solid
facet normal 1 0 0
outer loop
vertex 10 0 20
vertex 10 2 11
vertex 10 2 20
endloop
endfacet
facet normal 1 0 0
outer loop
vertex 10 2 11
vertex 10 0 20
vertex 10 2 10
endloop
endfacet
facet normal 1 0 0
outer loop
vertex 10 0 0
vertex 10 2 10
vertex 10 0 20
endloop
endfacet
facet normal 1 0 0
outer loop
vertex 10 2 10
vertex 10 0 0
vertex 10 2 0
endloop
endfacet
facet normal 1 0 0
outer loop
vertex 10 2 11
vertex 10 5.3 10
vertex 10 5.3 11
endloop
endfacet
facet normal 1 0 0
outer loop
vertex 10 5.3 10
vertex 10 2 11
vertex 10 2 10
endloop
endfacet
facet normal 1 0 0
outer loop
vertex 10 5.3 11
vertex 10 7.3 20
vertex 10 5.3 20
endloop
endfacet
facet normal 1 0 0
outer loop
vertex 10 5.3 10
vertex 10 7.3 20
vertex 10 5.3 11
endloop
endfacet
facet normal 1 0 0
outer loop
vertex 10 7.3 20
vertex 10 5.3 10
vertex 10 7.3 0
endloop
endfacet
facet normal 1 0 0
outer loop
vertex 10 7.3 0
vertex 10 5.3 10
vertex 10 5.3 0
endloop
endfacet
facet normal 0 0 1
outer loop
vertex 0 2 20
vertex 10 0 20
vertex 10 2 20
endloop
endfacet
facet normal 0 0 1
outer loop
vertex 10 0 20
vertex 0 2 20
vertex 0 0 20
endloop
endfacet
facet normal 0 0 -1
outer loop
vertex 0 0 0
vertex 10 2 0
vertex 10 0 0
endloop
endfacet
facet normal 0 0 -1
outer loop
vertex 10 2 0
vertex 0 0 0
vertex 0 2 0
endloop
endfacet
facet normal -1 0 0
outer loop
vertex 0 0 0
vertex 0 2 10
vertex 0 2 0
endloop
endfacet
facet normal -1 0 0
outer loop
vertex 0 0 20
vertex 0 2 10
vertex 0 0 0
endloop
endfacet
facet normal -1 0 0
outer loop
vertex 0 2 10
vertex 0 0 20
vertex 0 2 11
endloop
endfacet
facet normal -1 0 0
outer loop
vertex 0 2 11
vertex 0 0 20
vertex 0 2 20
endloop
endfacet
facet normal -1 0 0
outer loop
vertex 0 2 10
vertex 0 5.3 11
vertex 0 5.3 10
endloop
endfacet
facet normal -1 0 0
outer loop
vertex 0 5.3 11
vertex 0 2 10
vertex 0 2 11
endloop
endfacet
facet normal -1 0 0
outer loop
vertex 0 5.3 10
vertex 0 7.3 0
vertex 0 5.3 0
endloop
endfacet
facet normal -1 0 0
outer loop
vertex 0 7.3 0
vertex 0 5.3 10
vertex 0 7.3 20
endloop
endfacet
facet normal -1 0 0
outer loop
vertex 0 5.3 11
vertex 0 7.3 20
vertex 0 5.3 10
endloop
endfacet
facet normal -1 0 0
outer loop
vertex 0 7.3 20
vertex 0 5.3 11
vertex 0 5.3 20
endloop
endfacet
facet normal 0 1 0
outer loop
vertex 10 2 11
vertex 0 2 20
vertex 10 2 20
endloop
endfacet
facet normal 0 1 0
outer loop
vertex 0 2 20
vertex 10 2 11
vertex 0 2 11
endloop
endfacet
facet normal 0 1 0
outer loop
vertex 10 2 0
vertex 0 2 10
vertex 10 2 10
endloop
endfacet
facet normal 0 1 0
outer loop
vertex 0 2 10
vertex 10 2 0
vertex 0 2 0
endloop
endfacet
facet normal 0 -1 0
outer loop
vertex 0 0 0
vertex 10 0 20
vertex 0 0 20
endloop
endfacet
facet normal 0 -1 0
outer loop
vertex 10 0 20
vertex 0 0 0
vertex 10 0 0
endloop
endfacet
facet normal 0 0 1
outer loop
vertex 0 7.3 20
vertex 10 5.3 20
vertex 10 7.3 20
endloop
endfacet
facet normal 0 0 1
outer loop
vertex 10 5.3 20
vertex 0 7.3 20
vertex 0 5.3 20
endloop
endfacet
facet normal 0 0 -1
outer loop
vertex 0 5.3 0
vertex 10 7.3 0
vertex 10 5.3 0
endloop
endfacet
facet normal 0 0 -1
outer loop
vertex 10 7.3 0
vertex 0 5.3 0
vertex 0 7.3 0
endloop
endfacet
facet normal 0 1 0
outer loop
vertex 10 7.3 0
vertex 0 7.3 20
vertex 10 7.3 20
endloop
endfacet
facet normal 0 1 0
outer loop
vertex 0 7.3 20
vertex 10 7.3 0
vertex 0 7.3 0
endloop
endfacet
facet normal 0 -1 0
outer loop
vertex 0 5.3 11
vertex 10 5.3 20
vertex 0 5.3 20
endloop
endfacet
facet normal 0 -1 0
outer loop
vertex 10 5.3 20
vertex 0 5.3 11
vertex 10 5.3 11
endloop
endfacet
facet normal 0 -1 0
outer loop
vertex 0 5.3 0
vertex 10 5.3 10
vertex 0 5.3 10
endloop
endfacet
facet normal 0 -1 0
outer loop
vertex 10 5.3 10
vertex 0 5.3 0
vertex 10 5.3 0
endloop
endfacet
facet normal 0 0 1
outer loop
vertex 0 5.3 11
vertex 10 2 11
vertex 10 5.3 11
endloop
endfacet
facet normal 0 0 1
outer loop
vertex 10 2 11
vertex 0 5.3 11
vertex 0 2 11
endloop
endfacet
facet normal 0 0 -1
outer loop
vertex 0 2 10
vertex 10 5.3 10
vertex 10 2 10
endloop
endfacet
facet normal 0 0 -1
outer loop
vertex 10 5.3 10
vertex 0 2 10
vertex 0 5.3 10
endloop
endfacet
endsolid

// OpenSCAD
cube([10,2,20]);
translate([0,5.3,0])
cube([10,2,20]);
translate([0,2,10])
cube([10,4,1]);
